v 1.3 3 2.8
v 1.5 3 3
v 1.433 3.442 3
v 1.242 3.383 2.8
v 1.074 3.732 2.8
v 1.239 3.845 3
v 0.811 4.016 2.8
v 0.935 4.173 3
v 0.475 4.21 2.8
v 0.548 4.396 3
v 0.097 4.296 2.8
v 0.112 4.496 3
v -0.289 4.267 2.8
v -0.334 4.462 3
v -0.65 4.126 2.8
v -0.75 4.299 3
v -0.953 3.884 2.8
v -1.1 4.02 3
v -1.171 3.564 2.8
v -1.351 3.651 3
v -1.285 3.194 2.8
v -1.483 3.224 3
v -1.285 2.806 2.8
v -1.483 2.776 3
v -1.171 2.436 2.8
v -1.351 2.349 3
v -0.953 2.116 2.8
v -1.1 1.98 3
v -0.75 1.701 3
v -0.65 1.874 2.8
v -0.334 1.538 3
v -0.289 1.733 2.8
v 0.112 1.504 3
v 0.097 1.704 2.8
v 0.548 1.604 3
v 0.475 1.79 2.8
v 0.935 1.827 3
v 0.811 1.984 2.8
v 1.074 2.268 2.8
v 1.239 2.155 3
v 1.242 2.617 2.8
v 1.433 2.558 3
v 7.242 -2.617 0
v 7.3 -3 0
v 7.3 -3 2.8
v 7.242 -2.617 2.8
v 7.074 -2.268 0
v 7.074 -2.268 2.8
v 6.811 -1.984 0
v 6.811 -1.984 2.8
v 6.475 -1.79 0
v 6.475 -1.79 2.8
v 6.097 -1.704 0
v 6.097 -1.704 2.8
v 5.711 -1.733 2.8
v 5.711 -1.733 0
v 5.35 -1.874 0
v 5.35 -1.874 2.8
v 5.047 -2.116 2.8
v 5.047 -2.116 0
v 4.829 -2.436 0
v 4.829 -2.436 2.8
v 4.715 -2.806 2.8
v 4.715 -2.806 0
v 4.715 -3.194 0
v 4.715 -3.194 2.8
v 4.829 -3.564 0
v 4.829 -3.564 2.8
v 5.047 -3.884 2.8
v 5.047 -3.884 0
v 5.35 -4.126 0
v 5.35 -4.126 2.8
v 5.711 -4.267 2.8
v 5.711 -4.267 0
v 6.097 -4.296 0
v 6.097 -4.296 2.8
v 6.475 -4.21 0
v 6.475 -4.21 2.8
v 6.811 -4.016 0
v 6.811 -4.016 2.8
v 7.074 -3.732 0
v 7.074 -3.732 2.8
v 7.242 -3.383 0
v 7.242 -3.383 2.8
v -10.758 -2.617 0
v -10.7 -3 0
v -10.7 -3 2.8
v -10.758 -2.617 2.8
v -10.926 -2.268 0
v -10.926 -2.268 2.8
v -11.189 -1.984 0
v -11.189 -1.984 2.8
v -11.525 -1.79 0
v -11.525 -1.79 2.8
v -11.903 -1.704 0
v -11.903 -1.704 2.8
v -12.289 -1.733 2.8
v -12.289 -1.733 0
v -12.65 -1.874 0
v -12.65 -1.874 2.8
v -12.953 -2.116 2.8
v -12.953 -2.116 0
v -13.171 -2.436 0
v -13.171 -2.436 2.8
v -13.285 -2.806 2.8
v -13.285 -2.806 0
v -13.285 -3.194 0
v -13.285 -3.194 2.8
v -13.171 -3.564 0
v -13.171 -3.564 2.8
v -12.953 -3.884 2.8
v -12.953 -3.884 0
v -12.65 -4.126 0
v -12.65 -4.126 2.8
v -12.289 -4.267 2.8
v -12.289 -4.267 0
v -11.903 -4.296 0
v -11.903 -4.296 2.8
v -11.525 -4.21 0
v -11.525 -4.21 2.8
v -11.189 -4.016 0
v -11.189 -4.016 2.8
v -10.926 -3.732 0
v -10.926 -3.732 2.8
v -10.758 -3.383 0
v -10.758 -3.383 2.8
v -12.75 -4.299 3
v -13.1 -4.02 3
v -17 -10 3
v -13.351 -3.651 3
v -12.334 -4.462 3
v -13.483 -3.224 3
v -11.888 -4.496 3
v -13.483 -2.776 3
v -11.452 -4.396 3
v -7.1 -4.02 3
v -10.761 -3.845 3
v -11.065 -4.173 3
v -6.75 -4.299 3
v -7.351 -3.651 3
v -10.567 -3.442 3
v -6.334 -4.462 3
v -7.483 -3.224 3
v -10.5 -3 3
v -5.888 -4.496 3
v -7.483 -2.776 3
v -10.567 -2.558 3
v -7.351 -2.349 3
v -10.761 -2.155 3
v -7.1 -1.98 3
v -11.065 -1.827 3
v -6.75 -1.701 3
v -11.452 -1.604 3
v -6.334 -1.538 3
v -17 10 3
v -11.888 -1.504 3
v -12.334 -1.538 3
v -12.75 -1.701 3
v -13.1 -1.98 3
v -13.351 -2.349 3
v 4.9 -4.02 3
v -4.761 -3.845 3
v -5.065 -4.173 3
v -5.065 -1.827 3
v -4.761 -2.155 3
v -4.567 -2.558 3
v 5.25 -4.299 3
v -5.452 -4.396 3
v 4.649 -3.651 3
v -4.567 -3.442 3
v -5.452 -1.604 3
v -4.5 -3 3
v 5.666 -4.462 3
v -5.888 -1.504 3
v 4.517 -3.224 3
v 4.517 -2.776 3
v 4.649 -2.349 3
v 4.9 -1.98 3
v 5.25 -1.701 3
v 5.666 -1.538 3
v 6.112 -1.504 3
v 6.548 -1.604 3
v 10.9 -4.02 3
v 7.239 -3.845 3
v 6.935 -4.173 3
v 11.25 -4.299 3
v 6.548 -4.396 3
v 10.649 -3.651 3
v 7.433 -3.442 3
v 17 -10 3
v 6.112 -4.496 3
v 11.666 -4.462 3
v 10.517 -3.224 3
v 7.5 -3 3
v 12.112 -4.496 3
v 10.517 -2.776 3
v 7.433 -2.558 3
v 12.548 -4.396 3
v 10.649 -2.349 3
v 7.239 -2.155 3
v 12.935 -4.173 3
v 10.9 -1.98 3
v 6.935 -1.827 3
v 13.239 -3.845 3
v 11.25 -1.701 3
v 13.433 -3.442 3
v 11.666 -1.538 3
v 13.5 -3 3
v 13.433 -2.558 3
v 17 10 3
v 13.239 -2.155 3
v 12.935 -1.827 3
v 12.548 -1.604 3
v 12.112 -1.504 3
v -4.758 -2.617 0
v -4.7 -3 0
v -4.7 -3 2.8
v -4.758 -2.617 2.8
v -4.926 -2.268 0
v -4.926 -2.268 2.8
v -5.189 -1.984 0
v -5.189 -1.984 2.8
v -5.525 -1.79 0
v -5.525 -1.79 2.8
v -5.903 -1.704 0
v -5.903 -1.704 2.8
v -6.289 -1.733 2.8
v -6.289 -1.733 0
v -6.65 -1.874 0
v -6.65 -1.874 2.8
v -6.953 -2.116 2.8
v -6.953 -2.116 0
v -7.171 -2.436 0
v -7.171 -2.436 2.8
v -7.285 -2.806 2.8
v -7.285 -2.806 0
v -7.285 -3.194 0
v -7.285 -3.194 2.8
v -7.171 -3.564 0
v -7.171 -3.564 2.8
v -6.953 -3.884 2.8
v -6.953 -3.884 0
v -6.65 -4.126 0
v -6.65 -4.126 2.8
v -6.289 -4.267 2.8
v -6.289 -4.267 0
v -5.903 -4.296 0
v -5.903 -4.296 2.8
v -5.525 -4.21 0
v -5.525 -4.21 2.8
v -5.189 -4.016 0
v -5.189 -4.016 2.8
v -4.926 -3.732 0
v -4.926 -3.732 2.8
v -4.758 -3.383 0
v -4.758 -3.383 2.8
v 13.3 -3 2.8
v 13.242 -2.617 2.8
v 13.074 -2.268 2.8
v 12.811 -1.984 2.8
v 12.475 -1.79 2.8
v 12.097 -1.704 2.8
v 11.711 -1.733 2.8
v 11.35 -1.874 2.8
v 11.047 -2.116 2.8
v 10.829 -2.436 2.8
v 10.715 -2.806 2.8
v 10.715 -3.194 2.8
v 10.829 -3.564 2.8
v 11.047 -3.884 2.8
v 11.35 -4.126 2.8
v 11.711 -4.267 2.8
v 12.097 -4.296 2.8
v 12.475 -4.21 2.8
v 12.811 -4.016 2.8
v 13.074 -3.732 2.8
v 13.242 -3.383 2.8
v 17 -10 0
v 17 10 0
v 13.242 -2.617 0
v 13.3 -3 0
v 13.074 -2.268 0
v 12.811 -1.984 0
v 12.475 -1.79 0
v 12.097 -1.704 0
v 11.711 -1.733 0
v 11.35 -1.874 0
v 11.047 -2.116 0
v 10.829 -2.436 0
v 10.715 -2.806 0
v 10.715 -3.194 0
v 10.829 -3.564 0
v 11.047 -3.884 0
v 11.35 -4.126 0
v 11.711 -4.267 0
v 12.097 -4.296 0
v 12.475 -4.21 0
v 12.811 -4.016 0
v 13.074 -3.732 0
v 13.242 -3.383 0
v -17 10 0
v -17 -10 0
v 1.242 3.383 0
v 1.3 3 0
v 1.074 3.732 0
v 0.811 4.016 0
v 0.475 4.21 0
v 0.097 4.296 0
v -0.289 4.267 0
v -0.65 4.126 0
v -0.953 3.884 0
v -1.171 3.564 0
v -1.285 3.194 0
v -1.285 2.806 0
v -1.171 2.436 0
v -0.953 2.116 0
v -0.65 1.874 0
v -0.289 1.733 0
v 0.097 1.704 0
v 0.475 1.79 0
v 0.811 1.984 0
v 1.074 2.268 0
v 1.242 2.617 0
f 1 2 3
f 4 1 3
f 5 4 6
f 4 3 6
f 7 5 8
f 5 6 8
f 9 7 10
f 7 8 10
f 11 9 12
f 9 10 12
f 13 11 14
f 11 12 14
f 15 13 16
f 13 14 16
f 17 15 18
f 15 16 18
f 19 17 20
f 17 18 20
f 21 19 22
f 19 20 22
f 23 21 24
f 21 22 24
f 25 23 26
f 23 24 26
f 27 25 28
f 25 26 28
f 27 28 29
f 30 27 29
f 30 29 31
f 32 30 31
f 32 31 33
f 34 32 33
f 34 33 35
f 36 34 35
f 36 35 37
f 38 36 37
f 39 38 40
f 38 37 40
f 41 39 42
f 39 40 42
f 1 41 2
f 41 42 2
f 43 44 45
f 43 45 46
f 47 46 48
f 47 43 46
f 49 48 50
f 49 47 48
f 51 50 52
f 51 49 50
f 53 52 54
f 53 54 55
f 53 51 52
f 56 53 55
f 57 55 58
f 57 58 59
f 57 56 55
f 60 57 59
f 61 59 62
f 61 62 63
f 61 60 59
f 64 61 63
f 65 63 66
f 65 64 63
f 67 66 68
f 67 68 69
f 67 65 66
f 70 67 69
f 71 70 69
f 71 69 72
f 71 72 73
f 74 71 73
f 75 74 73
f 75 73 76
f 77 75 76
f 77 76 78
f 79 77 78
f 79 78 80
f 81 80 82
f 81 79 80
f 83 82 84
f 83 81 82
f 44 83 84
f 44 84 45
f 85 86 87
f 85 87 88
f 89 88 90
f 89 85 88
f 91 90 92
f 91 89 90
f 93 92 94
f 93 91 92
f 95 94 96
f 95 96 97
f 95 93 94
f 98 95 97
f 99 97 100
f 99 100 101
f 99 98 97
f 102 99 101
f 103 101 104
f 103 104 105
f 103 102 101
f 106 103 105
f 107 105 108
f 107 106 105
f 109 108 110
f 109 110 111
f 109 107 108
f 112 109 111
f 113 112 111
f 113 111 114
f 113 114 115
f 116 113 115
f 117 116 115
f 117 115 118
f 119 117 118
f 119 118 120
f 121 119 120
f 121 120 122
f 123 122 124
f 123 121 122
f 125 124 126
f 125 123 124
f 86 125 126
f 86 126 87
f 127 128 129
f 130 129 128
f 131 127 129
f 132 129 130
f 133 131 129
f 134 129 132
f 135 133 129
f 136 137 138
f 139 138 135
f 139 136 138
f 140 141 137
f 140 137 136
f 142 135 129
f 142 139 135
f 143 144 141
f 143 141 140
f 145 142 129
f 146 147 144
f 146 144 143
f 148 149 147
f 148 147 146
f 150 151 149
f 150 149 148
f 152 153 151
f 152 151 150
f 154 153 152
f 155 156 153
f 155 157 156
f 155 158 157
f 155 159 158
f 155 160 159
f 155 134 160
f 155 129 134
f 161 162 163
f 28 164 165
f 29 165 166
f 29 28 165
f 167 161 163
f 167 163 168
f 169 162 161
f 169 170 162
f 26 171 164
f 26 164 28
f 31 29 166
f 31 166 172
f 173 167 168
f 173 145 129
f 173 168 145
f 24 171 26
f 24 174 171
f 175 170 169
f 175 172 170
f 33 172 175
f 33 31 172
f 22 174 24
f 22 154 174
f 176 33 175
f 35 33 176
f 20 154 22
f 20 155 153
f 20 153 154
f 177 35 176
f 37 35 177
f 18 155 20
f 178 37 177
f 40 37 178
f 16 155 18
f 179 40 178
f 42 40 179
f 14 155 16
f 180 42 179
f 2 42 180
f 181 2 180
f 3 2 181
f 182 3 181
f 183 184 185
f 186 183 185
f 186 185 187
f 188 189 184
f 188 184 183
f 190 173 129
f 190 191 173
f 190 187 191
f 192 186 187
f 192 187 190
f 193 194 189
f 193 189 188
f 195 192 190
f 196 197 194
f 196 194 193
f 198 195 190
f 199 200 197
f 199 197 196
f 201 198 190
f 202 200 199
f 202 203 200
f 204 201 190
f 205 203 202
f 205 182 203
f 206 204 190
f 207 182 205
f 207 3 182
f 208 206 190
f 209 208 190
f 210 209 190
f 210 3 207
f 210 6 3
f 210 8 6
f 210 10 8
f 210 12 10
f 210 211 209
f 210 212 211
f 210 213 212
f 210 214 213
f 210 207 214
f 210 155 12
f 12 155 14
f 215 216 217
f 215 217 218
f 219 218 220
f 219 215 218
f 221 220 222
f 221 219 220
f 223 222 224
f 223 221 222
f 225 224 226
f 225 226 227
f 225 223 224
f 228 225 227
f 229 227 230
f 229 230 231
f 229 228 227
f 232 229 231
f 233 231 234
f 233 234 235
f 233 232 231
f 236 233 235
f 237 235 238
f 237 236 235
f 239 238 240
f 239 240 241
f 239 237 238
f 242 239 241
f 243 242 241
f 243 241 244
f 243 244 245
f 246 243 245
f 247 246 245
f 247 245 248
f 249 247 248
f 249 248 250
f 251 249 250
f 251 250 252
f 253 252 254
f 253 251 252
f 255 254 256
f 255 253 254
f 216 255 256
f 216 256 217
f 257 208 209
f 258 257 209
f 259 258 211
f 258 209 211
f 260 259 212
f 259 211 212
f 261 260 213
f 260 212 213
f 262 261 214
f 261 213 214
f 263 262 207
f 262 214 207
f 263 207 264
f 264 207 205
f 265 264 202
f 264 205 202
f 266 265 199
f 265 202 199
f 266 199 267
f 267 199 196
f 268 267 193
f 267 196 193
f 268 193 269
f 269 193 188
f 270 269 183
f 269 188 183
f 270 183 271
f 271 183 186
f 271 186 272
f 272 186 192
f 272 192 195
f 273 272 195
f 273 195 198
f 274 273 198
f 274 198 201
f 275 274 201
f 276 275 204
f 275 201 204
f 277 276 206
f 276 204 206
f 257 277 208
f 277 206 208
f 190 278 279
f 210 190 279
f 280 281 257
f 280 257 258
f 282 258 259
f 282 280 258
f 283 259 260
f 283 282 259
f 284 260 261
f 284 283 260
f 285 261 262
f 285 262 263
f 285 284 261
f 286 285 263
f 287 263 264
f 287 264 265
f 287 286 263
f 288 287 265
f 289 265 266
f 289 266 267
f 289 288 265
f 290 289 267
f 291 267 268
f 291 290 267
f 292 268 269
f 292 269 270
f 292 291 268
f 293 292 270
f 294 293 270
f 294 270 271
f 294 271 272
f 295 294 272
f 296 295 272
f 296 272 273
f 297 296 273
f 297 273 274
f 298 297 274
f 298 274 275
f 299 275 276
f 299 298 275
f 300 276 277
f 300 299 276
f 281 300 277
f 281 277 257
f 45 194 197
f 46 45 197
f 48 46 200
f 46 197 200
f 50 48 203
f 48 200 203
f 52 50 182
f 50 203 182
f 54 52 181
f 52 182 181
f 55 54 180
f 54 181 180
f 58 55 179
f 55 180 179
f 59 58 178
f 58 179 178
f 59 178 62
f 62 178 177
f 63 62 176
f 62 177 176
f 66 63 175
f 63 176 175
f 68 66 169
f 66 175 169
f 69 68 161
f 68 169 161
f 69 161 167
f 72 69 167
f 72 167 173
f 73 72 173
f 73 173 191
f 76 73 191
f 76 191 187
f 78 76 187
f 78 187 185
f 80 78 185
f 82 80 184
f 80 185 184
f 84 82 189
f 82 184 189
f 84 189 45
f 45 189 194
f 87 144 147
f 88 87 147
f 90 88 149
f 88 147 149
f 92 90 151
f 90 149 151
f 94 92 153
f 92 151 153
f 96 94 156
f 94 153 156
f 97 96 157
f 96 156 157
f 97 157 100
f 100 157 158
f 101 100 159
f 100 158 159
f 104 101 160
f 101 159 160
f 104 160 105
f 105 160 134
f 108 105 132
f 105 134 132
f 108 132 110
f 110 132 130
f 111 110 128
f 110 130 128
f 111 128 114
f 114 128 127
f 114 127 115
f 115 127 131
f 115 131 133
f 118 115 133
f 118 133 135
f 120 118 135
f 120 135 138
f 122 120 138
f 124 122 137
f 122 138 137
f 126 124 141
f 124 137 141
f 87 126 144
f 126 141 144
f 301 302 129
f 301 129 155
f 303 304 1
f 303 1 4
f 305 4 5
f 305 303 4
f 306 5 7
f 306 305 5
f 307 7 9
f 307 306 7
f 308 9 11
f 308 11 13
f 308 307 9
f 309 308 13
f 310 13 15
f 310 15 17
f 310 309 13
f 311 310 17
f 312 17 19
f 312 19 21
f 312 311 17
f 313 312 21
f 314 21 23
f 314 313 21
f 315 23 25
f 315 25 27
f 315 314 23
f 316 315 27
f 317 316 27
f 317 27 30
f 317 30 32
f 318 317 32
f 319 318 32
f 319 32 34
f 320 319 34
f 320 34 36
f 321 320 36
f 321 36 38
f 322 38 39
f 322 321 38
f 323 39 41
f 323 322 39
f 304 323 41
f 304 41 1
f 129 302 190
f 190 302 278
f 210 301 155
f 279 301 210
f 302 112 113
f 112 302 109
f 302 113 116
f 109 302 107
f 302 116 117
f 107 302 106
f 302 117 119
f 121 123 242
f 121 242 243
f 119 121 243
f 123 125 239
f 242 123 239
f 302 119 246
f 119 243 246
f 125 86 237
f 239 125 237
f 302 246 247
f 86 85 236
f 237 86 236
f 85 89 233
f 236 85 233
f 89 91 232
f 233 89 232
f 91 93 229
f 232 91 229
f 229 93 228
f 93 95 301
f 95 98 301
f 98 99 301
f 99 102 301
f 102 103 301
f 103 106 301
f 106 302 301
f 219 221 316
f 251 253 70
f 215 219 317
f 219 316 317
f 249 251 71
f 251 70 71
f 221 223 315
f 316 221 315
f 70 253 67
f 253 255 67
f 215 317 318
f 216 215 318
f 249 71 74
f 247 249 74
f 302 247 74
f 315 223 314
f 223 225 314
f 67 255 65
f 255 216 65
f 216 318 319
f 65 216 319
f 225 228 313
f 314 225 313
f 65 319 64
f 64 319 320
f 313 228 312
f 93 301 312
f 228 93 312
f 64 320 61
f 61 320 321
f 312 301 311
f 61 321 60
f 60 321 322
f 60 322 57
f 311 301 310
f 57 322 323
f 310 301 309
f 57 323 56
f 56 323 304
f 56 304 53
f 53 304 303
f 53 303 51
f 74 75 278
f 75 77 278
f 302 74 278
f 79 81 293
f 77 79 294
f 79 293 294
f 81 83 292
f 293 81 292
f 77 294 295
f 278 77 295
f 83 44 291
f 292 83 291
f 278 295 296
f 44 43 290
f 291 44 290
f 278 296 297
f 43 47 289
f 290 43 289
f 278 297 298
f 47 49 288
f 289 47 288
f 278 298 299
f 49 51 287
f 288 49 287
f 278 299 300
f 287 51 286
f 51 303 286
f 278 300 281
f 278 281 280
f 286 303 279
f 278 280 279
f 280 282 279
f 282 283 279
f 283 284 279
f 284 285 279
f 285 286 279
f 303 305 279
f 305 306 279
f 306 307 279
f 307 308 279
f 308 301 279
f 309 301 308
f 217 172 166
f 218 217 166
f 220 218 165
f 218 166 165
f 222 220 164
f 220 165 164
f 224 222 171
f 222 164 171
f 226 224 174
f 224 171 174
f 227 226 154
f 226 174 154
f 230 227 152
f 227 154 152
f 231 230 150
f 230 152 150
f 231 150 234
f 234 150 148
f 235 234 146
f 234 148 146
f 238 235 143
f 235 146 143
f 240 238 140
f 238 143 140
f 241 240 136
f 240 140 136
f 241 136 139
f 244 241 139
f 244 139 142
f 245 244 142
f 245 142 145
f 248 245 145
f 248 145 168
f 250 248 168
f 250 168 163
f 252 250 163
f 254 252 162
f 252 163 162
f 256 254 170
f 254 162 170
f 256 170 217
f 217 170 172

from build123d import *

# Parameters (mm, degrees)
SKETCH_1_W      = 34
SKETCH_1_H      = 20
SKETCH_1_R      = 1.3
EXTRUDE_1_DEPTH = 3
CHAMFER_1_SIZE  = 0.2


with BuildPart() as part:
    # 草圖1 → 填料-伸長1 (new body)
    with BuildSketch(Plane.XY):
        Rectangle(SKETCH_1_W, SKETCH_1_H)
        with Locations((0, 3)):
            Circle(SKETCH_1_R, mode=Mode.SUBTRACT)
        with Locations((-6, -3)):
            Circle(SKETCH_1_R, mode=Mode.SUBTRACT)
        with Locations((6, -3)):
            Circle(SKETCH_1_R, mode=Mode.SUBTRACT)
        with Locations((12, -3)):
            Circle(SKETCH_1_R, mode=Mode.SUBTRACT)
        with Locations((-12, -3)):
            Circle(SKETCH_1_R, mode=Mode.SUBTRACT)
    extrude(amount=EXTRUDE_1_DEPTH)

    # 導角1
    chamfer_1_edges = [part.edges().sort_by_distance(p)[0] for p in [
        (-13.3, -3, 3),
        (-1.3, 3, 3),
        (4.7, -3, 3),
        (-7.3, -3, 3),
        (10.7, -3, 3),
    ]]
    chamfer(chamfer_1_edges, length=CHAMFER_1_SIZE)


solid = part.part
